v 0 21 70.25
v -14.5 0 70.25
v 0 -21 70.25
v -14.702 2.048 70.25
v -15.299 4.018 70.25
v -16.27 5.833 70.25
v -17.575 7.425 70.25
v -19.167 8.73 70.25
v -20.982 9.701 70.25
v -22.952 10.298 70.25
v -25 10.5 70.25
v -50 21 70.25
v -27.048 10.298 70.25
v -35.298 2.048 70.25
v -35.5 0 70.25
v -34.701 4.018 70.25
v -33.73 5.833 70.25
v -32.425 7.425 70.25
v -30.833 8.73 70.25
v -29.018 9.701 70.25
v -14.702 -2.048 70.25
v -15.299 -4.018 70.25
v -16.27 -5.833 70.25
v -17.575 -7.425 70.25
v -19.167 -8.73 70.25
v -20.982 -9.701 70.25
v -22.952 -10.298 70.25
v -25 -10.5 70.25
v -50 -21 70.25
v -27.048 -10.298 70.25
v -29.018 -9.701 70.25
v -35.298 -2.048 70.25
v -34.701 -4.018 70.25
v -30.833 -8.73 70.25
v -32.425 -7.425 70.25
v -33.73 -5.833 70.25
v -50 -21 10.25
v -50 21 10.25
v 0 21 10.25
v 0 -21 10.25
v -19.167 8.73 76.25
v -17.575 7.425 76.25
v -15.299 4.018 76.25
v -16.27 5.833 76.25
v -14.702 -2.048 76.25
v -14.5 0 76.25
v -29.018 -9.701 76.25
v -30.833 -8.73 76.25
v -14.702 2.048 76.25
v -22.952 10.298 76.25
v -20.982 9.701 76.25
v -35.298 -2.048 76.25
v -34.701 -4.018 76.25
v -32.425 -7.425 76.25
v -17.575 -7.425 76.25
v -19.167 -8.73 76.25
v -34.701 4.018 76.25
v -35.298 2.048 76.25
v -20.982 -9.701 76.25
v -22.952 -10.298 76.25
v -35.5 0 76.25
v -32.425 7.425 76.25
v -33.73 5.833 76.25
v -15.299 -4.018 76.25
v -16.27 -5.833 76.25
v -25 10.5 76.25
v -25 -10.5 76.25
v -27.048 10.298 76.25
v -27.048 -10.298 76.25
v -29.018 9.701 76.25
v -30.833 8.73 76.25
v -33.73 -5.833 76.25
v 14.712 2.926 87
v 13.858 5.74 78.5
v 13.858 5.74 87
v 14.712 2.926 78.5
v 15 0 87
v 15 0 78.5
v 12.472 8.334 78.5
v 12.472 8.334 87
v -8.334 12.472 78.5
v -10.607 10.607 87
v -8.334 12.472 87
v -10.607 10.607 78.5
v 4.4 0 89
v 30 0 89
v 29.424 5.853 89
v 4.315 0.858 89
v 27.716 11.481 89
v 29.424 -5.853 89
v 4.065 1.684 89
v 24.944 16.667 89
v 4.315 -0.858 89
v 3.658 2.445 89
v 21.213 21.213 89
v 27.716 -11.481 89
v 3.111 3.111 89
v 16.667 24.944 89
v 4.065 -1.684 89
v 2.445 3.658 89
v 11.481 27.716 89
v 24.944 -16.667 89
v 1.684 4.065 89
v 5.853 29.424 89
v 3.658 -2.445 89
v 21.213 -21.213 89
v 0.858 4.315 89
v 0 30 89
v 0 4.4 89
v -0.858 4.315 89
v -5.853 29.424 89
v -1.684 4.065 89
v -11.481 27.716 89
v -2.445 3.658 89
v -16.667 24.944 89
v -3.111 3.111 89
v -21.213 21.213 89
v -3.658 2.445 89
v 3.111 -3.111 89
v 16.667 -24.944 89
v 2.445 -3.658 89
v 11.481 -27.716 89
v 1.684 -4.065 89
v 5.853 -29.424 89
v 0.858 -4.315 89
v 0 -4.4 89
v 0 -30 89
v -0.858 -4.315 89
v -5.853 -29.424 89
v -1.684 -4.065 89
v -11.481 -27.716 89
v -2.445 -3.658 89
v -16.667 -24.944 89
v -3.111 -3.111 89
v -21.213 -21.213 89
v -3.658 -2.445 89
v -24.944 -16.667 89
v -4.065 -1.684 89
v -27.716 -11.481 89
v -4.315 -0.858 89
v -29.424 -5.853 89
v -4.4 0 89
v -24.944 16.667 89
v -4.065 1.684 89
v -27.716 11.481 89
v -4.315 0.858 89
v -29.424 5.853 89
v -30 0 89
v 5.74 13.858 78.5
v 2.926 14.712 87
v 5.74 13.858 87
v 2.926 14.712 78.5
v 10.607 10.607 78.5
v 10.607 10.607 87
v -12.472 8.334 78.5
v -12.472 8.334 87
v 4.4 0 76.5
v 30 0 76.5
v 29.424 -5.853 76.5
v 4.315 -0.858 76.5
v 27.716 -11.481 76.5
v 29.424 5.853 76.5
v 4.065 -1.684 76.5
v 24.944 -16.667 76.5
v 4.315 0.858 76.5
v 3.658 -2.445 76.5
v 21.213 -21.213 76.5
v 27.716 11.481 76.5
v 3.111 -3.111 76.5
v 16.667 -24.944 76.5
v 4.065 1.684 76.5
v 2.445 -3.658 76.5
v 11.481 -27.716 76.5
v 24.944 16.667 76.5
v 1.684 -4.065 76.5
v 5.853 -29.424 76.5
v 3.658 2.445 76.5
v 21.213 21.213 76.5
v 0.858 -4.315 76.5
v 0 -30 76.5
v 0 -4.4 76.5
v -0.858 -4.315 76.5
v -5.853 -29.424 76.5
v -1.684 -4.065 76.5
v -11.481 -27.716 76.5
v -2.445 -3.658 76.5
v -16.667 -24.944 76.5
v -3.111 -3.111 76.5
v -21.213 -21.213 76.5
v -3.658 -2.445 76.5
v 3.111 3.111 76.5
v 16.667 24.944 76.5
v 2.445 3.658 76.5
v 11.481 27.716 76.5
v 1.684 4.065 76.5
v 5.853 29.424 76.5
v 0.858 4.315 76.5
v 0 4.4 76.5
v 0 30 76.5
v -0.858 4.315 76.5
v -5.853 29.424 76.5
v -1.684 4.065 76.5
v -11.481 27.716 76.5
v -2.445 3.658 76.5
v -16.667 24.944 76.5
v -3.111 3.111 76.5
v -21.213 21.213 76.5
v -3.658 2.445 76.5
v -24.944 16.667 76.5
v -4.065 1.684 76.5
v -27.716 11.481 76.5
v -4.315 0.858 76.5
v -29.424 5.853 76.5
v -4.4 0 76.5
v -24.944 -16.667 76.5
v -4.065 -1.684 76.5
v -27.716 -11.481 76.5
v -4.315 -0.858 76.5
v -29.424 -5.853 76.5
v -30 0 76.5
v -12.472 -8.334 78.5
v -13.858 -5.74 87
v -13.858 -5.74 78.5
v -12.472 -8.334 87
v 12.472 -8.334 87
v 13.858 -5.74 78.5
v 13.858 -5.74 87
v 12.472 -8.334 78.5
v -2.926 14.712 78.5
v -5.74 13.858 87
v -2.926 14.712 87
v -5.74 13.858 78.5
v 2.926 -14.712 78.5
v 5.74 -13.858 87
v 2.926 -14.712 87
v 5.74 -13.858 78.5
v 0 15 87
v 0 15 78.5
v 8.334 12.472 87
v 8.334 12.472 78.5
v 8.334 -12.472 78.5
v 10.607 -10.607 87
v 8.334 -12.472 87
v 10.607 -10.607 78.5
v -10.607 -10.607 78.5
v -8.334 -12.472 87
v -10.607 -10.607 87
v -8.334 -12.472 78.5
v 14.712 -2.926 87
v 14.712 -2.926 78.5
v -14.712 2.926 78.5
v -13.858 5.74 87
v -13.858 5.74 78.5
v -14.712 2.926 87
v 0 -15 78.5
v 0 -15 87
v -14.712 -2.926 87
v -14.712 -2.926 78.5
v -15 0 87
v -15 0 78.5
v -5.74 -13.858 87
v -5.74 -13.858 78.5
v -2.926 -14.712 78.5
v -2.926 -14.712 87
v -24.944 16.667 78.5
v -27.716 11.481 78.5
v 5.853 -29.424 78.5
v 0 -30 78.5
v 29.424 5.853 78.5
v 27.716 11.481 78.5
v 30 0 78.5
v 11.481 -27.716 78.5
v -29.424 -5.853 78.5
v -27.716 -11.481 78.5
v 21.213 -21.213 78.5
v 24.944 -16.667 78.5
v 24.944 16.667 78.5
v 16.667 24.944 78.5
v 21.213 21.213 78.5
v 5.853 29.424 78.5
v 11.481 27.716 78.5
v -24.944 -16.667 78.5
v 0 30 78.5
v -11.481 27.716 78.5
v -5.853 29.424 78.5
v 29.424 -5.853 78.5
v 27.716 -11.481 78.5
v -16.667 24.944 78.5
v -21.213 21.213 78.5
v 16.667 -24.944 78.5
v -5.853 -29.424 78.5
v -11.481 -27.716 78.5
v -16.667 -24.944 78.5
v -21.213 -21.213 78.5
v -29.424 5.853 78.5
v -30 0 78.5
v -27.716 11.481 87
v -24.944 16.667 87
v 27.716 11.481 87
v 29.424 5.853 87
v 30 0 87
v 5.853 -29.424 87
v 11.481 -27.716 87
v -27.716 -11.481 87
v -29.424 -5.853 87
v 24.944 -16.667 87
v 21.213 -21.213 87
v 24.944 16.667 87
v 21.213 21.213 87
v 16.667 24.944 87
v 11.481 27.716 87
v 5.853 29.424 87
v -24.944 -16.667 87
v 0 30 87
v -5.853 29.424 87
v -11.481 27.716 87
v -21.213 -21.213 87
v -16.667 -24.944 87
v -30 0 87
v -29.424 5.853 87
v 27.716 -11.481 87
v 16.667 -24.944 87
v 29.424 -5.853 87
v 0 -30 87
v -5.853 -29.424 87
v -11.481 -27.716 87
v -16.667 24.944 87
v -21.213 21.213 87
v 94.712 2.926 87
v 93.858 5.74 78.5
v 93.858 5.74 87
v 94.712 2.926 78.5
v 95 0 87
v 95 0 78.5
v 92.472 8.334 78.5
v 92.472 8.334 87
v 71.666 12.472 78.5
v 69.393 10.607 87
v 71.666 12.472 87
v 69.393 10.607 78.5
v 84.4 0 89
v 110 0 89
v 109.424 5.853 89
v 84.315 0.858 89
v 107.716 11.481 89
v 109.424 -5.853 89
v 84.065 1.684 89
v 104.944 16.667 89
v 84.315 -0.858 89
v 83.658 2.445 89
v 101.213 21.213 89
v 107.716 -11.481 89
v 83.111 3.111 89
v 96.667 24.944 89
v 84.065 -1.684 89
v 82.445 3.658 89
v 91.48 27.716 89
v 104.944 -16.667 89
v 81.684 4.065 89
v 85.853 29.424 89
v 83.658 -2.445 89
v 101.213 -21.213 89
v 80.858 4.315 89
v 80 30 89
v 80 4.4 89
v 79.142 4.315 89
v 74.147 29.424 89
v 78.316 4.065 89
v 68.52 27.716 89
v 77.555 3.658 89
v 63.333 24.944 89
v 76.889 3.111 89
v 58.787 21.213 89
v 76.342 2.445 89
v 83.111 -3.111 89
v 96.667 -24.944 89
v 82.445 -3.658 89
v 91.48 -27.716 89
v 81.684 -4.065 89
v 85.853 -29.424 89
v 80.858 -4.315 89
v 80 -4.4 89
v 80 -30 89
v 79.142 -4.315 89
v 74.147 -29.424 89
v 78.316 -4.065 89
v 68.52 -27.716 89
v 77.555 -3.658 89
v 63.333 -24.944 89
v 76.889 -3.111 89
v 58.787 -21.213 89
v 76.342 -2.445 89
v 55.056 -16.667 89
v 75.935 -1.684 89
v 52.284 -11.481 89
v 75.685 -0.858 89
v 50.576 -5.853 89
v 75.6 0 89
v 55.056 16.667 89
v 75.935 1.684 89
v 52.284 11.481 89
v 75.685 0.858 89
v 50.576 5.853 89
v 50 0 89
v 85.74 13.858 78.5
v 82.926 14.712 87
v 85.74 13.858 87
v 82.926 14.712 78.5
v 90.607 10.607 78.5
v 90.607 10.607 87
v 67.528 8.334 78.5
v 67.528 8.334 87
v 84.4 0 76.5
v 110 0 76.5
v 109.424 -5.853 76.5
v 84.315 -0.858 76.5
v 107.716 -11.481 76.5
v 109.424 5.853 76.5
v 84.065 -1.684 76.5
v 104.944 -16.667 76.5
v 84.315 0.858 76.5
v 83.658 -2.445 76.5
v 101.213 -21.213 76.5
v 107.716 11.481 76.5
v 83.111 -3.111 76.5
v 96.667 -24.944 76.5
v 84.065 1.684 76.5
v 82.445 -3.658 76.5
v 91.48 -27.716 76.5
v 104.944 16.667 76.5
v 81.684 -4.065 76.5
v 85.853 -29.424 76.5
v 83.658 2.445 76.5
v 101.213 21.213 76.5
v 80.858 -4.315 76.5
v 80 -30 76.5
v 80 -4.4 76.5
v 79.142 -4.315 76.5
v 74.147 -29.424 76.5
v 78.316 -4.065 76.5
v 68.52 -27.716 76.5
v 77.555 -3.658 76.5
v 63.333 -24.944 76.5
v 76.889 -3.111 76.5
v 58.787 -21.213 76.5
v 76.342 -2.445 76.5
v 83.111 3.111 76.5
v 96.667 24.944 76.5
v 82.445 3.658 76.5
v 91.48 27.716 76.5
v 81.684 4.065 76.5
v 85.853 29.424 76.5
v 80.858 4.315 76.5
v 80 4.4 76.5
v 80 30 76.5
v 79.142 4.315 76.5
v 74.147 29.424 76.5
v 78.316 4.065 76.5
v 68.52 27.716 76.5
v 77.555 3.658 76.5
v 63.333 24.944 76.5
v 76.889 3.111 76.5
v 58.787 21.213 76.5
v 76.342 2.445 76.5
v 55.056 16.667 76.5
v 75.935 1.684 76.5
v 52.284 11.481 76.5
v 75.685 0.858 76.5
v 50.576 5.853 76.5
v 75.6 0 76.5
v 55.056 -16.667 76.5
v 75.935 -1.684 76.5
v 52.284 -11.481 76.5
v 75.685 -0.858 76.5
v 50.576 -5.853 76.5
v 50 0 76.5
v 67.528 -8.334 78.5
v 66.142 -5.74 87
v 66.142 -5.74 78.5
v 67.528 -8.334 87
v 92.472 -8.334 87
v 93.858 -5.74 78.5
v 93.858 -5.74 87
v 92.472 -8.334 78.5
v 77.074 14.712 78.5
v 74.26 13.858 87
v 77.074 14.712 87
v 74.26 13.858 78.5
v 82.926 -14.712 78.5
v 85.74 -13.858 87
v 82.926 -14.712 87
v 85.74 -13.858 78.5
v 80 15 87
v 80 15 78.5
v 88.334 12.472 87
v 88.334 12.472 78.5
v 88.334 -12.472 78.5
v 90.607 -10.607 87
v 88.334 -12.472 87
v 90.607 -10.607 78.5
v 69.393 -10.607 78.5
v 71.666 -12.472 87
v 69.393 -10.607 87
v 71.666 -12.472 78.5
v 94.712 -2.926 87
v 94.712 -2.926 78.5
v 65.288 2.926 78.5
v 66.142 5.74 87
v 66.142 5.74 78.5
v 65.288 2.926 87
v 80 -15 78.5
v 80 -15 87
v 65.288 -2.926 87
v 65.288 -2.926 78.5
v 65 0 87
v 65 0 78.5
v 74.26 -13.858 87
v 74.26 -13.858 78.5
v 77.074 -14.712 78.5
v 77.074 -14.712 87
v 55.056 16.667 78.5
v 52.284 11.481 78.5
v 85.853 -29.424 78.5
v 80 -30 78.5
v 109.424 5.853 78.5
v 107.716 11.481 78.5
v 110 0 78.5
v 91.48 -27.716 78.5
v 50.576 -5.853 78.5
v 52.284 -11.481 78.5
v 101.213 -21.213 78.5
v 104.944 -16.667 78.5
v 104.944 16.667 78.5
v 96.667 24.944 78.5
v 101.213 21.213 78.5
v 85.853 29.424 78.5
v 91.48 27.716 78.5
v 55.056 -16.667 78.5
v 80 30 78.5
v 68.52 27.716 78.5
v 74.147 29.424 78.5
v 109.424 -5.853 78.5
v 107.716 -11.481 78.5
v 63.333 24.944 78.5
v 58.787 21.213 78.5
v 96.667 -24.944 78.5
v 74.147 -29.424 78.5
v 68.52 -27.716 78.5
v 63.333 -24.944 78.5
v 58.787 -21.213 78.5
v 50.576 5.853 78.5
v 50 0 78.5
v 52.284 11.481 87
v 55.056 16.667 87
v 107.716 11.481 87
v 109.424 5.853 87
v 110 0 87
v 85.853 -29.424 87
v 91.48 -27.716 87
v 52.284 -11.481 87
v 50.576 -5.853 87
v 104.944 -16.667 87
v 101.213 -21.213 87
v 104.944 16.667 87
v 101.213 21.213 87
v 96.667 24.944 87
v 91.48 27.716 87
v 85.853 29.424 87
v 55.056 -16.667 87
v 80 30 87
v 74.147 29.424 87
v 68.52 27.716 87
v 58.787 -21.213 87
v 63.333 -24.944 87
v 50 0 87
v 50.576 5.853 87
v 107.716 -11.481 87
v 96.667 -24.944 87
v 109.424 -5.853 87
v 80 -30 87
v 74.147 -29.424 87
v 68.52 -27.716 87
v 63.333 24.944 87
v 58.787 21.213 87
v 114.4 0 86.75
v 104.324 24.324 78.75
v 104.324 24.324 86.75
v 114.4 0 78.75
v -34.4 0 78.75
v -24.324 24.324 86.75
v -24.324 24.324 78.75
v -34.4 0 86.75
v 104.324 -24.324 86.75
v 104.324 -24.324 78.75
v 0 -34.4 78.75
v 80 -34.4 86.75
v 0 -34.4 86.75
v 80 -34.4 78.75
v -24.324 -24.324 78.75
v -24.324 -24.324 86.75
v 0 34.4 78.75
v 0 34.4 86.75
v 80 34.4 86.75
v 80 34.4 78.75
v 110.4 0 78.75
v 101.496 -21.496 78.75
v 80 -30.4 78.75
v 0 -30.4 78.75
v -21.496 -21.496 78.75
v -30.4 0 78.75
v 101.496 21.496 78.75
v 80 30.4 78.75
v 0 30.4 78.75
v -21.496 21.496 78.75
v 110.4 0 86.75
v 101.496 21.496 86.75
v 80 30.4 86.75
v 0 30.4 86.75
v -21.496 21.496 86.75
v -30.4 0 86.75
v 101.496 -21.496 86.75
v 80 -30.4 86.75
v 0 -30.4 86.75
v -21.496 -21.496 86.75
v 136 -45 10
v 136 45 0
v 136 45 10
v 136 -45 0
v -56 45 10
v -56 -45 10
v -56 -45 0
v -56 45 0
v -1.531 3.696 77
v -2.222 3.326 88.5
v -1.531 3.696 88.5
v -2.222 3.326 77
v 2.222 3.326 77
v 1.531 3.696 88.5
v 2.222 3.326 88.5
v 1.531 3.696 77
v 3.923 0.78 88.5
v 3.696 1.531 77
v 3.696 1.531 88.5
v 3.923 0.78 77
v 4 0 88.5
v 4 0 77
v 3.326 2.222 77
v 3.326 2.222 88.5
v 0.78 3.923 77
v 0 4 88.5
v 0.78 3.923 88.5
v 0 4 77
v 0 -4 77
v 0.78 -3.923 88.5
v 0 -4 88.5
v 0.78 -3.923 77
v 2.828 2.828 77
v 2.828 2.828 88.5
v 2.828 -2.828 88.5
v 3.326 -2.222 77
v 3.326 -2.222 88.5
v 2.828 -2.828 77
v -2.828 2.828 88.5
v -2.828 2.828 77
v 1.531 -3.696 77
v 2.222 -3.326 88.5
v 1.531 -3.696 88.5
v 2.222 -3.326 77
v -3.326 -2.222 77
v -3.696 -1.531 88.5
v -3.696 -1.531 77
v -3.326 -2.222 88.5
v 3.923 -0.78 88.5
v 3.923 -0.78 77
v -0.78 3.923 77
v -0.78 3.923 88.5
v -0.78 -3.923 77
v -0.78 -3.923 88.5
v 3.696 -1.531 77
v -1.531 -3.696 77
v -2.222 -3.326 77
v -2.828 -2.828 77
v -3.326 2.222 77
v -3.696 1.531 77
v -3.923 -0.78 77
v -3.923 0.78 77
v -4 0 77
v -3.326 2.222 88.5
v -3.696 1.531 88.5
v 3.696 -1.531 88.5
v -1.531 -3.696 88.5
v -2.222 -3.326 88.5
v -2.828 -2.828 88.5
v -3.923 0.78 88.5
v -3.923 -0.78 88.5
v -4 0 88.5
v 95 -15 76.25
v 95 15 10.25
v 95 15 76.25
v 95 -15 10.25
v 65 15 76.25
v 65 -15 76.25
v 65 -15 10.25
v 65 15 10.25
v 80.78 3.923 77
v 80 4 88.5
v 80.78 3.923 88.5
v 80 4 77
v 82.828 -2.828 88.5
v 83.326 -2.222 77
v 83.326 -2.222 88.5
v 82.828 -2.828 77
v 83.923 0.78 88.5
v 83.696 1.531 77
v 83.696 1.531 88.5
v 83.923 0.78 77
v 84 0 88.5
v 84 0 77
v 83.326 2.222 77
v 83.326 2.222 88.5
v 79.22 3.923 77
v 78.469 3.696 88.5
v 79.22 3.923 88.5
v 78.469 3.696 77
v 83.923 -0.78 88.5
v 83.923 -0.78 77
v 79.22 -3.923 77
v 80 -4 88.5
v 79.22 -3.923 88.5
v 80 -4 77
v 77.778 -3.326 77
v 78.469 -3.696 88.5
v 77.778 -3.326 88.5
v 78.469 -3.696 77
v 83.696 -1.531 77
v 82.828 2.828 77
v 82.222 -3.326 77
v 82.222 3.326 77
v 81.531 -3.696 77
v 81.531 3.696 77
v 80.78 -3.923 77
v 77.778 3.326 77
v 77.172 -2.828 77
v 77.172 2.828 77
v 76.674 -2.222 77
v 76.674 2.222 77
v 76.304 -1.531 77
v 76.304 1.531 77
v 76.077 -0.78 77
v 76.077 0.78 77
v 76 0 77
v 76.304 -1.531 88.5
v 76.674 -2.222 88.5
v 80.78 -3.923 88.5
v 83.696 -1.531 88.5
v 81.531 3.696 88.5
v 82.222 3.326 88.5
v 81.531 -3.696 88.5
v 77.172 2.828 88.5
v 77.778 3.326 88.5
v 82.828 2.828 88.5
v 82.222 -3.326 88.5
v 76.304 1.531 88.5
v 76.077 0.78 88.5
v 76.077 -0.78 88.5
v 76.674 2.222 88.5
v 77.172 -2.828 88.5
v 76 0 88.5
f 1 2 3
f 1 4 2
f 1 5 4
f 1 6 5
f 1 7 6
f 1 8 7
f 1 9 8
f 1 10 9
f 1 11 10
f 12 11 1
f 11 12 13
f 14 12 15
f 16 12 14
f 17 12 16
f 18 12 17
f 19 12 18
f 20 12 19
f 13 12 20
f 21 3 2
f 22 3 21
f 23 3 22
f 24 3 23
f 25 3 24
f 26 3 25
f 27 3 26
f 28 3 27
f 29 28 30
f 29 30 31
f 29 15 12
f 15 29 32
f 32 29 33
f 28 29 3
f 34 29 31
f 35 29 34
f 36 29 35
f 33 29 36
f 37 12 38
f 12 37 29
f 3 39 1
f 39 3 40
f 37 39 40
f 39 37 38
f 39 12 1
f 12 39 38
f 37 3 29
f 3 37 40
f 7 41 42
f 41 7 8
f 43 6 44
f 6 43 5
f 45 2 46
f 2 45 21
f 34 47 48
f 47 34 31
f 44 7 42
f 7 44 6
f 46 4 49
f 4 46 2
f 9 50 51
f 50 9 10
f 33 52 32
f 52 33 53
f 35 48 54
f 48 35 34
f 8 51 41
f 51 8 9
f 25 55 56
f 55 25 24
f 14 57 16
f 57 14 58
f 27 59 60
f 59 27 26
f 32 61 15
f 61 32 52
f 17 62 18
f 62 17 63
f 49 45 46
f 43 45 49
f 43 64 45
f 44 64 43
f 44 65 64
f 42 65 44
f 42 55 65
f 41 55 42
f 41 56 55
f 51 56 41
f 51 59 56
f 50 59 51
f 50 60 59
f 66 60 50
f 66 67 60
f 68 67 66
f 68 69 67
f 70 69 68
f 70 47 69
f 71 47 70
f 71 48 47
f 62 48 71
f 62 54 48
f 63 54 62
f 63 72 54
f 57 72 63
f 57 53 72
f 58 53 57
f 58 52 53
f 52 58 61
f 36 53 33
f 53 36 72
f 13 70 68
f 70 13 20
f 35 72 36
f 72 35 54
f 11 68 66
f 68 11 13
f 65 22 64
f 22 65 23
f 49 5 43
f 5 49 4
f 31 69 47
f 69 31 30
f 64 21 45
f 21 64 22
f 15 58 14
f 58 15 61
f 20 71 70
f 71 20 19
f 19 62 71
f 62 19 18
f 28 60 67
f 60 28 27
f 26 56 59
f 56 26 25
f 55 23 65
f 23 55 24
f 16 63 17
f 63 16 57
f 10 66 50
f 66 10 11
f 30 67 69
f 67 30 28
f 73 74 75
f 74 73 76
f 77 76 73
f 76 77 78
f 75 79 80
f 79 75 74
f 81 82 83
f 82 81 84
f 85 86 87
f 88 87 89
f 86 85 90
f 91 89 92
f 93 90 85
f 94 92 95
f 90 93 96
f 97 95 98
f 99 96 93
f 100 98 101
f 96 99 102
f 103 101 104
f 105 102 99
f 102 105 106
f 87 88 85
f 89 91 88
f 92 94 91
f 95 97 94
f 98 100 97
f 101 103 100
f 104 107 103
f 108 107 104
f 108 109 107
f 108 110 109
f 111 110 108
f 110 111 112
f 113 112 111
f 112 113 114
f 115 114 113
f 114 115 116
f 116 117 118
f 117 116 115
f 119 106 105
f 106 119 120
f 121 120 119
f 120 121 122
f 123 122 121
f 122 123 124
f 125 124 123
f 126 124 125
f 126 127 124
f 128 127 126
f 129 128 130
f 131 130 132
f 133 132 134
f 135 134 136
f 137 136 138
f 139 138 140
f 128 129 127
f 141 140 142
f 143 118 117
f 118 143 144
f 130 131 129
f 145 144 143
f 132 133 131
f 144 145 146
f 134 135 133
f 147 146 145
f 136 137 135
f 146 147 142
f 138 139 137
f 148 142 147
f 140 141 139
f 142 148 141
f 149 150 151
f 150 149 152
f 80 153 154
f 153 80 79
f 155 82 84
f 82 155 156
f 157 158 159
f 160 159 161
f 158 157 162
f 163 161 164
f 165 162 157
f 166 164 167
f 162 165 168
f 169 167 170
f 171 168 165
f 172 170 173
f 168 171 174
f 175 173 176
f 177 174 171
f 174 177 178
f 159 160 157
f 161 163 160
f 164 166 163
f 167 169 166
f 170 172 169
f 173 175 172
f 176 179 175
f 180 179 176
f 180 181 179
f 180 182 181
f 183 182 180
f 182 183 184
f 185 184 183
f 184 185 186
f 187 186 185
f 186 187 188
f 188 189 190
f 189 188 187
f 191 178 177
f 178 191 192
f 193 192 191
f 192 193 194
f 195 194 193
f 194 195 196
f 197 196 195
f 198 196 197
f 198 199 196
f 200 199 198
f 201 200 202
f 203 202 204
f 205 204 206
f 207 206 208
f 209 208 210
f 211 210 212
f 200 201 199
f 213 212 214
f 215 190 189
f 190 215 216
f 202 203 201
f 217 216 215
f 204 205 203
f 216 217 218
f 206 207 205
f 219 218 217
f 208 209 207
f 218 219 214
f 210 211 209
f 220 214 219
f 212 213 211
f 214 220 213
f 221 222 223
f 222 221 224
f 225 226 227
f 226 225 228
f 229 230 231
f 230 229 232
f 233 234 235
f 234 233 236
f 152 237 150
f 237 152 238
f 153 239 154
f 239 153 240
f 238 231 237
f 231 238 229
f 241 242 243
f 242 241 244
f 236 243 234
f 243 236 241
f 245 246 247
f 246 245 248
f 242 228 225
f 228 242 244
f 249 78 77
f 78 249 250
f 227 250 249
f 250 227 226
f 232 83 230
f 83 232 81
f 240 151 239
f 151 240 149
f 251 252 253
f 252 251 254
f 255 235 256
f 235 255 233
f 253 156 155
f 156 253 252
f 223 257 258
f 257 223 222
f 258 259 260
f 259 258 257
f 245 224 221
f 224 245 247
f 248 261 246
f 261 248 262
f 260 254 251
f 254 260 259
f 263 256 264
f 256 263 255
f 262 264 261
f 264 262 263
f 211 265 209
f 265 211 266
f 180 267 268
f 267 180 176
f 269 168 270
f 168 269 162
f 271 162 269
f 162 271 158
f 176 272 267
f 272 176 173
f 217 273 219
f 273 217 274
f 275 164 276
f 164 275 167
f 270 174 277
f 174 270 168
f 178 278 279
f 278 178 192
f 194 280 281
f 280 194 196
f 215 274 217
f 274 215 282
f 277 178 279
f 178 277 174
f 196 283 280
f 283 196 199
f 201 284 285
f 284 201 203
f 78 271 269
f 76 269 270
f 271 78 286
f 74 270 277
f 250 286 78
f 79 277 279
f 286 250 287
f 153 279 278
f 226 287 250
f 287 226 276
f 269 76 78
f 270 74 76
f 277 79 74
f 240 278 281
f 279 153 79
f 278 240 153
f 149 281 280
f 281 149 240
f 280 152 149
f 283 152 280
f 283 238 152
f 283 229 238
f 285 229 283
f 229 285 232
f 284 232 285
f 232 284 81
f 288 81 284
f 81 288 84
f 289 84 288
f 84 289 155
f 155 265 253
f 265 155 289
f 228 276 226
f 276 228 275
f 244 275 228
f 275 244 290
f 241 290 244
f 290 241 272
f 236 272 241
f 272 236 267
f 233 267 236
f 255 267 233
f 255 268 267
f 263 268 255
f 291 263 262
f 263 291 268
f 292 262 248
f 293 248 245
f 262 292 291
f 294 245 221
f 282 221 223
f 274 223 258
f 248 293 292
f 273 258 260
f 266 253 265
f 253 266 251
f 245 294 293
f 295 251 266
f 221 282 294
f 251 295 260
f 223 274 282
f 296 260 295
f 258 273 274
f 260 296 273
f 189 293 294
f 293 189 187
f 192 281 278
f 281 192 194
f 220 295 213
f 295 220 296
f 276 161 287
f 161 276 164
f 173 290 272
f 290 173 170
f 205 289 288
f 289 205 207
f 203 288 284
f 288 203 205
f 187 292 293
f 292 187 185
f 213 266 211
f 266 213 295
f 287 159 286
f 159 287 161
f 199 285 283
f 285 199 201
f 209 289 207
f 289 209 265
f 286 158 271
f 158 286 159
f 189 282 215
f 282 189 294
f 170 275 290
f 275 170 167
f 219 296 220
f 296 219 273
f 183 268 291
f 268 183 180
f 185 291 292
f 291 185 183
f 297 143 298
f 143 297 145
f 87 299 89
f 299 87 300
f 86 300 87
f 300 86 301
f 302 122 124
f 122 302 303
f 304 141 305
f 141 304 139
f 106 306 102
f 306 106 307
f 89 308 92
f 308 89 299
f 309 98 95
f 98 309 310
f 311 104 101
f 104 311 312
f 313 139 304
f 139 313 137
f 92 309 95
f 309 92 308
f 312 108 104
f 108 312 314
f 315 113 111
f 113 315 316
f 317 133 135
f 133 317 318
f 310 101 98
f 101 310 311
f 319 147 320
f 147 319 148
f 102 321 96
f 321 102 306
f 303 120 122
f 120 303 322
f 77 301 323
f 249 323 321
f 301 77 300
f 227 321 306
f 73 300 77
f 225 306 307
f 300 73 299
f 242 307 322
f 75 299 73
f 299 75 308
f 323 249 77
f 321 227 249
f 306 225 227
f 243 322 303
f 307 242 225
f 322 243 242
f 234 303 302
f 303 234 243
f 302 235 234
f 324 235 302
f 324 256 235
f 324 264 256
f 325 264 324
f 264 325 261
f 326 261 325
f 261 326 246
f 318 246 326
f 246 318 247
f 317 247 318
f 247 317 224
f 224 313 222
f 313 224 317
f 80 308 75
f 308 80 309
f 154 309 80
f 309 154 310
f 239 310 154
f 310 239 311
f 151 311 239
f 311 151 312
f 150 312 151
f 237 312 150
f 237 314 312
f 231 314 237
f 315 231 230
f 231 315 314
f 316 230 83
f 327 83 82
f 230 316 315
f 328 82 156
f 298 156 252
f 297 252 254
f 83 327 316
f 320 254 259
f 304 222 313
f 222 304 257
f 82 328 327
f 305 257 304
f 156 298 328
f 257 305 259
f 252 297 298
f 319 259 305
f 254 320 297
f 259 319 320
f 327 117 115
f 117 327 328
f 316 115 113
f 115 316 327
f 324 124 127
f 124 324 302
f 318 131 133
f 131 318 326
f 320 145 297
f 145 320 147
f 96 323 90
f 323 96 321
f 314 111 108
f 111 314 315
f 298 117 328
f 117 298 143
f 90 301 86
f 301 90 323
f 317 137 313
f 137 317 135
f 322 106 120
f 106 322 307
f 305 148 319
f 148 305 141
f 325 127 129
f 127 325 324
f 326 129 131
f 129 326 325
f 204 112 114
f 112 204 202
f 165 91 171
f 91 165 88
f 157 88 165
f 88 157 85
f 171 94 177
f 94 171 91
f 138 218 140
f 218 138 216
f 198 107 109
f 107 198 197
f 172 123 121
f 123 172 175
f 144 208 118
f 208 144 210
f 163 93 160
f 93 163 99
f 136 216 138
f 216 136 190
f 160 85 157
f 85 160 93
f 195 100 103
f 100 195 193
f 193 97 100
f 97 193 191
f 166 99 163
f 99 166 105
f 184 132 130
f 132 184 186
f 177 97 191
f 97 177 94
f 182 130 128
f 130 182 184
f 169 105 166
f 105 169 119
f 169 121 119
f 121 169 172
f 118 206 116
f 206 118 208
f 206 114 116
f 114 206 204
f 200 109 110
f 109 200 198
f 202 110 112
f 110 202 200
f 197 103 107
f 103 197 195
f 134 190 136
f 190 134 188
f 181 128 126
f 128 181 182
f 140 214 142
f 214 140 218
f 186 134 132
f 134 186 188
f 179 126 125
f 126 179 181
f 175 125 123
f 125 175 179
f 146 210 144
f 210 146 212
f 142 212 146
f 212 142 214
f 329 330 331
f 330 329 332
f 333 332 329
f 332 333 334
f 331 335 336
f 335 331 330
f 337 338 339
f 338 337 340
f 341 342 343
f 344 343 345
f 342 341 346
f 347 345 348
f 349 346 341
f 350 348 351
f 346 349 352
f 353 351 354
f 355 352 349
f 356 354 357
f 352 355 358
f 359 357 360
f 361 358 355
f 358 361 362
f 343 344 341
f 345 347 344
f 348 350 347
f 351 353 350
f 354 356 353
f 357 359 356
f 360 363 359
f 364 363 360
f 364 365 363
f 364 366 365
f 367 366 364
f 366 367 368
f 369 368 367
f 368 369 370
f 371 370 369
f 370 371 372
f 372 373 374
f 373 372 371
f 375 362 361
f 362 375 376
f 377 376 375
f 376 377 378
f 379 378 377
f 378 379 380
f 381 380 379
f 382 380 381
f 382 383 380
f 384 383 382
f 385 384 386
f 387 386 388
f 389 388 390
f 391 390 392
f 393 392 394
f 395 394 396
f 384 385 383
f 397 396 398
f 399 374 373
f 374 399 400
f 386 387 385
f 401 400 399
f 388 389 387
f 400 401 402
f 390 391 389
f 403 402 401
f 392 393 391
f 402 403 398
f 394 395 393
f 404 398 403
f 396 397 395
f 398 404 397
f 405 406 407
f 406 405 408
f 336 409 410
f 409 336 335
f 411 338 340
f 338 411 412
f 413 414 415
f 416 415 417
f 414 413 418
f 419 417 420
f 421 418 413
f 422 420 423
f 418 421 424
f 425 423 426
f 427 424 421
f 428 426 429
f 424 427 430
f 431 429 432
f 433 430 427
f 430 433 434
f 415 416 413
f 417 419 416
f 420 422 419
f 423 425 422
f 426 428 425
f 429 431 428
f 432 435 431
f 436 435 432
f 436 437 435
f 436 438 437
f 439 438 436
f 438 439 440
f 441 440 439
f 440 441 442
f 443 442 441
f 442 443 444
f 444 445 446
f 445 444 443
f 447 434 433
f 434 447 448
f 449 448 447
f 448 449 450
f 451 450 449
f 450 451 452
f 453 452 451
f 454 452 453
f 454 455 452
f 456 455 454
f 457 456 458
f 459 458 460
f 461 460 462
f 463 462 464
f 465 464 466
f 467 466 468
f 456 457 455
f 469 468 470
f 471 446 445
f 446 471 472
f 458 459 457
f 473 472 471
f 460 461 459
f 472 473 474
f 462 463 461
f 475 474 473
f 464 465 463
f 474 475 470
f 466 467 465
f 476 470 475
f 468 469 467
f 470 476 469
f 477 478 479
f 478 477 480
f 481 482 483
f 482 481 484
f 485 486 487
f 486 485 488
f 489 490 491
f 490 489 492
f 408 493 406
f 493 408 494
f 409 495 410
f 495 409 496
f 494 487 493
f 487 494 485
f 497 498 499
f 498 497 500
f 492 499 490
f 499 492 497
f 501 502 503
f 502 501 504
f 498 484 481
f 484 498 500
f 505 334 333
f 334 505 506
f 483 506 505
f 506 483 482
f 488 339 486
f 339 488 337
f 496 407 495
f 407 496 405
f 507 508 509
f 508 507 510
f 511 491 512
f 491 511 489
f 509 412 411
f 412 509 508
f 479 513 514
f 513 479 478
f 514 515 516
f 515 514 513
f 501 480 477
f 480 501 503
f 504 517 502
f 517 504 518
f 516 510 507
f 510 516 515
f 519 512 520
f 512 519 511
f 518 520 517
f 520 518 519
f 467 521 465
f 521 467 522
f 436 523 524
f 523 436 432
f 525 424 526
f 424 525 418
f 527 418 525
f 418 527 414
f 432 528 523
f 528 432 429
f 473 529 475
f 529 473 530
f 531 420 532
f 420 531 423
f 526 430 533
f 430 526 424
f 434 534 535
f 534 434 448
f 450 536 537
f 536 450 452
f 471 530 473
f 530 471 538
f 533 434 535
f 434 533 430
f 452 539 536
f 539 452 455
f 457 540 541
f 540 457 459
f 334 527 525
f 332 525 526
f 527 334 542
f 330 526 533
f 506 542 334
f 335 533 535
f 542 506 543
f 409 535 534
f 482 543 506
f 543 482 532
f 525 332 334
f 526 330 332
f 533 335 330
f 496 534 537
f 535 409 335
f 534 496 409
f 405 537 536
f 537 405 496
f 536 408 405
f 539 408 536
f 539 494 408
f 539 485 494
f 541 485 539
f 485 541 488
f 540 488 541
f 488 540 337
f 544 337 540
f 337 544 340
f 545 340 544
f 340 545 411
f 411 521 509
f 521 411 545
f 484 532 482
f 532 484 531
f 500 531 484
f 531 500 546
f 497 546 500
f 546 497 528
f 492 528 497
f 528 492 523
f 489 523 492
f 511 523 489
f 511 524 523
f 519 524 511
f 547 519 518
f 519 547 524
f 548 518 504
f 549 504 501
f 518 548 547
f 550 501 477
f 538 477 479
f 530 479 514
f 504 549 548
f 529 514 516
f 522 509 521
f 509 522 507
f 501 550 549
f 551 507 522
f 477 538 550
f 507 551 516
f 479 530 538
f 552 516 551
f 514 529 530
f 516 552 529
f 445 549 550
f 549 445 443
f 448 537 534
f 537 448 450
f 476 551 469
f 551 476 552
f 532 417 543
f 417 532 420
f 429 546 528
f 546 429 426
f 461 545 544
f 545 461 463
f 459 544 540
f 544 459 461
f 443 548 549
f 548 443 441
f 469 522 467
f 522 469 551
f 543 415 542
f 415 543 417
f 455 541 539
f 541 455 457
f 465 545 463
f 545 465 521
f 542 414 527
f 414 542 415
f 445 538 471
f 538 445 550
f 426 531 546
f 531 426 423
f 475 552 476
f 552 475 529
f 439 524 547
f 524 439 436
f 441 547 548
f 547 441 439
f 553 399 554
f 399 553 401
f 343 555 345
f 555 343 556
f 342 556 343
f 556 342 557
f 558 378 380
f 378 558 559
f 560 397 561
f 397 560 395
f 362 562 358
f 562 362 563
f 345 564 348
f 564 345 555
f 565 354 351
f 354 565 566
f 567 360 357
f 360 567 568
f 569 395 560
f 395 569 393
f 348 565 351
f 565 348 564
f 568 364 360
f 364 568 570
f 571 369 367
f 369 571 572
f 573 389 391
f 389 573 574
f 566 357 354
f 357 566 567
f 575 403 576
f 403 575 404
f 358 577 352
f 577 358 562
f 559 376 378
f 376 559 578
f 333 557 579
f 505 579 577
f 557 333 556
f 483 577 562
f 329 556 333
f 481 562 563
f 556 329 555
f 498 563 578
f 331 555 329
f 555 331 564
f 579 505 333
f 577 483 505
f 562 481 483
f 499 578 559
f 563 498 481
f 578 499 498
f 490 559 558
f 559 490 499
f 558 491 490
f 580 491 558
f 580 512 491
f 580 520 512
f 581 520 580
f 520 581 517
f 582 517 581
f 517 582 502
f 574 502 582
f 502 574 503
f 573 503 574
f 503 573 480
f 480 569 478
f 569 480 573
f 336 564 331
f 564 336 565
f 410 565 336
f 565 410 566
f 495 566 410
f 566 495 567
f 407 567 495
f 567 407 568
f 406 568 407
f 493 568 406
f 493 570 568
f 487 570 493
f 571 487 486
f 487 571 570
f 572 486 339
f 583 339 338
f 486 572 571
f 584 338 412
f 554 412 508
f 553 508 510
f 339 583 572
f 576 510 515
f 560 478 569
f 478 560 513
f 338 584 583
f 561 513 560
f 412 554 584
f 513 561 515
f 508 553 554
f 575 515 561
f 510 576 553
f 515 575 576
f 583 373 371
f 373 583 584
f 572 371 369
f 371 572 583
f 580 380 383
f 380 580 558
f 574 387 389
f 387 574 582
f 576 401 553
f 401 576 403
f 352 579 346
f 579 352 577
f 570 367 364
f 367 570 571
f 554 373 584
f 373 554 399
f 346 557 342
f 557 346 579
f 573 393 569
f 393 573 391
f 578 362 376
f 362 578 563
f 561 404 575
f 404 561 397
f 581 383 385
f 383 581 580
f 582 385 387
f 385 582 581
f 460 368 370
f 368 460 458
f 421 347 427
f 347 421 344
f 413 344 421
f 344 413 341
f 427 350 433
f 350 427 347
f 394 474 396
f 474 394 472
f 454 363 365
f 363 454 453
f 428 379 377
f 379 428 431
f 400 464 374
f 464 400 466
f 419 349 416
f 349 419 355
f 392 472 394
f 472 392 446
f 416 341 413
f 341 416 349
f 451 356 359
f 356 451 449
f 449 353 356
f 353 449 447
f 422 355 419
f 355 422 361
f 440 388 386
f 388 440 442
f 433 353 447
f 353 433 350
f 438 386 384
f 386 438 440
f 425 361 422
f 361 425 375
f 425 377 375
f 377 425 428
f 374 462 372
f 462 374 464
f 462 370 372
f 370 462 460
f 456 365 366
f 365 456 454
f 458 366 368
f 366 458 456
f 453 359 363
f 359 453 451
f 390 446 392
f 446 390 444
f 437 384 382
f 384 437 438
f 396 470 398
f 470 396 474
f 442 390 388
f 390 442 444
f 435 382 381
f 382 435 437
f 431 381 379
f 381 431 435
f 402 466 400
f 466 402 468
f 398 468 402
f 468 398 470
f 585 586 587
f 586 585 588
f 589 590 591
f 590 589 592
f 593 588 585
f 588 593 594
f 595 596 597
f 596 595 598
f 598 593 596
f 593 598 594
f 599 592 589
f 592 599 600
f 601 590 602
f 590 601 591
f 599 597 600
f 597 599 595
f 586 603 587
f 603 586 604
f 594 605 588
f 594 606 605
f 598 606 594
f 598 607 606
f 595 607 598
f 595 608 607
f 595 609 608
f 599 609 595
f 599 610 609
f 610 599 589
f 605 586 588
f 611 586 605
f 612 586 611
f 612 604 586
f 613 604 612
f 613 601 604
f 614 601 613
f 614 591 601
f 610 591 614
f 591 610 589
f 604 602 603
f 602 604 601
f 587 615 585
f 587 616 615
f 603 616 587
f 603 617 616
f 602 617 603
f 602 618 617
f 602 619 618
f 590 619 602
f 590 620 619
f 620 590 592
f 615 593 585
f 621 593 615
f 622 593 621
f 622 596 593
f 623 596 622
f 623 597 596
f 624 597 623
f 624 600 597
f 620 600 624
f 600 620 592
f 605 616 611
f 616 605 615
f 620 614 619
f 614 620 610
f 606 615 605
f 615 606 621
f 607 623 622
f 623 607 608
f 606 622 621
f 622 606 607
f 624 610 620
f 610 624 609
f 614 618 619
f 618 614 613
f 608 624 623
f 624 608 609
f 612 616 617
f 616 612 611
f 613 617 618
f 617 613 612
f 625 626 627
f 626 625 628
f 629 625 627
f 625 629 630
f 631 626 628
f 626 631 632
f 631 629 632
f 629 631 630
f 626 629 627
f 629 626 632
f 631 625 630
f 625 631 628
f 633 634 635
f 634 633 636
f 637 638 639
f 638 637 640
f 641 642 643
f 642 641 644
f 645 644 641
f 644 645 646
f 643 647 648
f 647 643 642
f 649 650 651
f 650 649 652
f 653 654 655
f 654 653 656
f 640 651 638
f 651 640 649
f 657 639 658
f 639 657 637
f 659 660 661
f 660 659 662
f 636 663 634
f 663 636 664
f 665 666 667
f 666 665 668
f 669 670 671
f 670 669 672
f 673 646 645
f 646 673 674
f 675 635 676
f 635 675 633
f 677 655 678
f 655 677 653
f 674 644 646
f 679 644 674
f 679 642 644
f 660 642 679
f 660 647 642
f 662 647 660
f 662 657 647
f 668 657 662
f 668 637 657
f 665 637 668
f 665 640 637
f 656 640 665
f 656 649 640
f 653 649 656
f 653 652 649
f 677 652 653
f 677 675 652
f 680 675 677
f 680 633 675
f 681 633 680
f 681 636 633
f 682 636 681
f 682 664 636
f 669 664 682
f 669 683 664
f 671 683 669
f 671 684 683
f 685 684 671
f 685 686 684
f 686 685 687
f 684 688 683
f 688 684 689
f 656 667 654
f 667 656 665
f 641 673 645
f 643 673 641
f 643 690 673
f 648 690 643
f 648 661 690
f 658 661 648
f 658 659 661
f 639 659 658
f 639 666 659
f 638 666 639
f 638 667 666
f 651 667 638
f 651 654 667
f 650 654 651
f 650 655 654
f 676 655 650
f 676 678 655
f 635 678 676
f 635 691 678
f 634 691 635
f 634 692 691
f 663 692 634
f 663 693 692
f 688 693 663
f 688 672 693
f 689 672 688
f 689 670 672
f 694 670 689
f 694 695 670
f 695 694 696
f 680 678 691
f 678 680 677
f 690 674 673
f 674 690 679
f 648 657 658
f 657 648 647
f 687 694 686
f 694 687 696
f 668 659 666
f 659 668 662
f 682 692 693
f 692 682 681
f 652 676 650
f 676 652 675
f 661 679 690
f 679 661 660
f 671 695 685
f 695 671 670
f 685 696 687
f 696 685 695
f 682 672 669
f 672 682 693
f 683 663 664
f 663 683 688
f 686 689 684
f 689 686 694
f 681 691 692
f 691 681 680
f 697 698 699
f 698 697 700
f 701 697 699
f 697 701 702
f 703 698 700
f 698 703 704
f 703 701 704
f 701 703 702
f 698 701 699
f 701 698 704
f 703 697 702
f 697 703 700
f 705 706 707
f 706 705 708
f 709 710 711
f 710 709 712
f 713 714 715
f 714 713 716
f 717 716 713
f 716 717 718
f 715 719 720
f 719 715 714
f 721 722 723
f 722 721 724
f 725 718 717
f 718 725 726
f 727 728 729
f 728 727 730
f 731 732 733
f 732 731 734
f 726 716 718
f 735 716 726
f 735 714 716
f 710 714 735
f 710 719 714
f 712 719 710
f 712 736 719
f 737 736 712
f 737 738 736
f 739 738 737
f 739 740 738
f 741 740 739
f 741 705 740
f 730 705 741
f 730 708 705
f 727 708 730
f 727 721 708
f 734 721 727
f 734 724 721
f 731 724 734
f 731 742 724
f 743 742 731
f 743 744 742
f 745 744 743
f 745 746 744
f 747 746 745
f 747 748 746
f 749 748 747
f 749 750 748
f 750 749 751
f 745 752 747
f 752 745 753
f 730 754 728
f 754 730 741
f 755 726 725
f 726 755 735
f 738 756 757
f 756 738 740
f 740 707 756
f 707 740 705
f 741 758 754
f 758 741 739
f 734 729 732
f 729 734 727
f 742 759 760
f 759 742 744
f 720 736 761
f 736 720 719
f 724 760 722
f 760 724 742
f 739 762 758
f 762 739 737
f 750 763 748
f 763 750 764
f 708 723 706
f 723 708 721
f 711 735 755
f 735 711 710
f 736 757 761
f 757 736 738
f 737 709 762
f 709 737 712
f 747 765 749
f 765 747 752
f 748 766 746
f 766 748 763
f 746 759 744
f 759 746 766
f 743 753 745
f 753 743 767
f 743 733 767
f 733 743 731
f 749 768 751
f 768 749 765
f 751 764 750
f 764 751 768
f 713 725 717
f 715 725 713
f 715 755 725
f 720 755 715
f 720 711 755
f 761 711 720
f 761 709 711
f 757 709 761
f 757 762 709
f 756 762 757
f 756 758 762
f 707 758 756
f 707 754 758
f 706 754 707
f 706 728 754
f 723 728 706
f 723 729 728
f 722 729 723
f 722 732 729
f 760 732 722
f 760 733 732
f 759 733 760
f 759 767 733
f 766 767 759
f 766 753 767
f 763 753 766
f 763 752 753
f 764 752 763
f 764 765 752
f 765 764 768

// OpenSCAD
$fn = 32;

// ------------------------------------------------------------------------
// Motor belt drive: span 80 mm, pulleys d60, belt 8 mm wide
// Every part is its own module, assembly() places every instance.
// ------------------------------------------------------------------------

// --- part 1 ---
module base_plate() {
  difference() {
    translate([-96, -45, 0]) cube([192, 90, 10]);
  }
}

// --- part 2 ---
module motor() {
  union() {
    translate([-30, -21, 0]) cube([60, 42, 50]);
    translate([33, 0, 25]) rotate([0, 90, 0]) cylinder(h = 6, d = 21, center = true);
  }
}

// --- part 3 ---
module drive_shaft() {
  translate([0, 0, -5.75]) cylinder(h = 11.5, d = 8);
}

// --- part 4 ---
module pulley_drive() {
  difference() {
    union() {
      cylinder(h = 12.5, d = 30);
      cylinder(h = 2, d = 60);
      translate([0, 0, 10.5]) cylinder(h = 2, d = 60);
    }
    translate([0, 0, -1]) cylinder(h = 14.5, d = 8.8);
  }
}

// --- part 5 ---
module idler_post() {
  translate([-15, -15, 0]) cube([30, 30, 66]);
}

// --- part 6 ---
module driven_shaft() {
  translate([0, 0, -5.75]) cylinder(h = 11.5, d = 8);
}

// --- part 7 ---
module pulley_driven() {
  difference() {
    union() {
      cylinder(h = 12.5, d = 30);
      cylinder(h = 2, d = 60);
      translate([0, 0, 10.5]) cylinder(h = 2, d = 60);
    }
    translate([0, 0, -1]) cylinder(h = 14.5, d = 8.8);
  }
}

// --- part 8 ---
module drive_belt() {
  difference() {
    linear_extrude(height = 8) polygon(points = concat([for (a = [90 : 45 : 270]) [34.4 * cos(a), 34.4 * sin(a)]], [for (a = [270 : 45 : 450]) [80 + 34.4 * cos(a), 34.4 * sin(a)]]));
    translate([0, 0, -1]) linear_extrude(height = 10) polygon(points = concat([for (a = [90 : 45 : 270]) [30.4 * cos(a), 30.4 * sin(a)]], [for (a = [270 : 45 : 450]) [80 + 30.4 * cos(a), 30.4 * sin(a)]]));
  }
}

// --- assembly ---
module assembly() {
  color([0.80, 0.24, 0.20]) translate([40, 0, 0]) rotate([0, 0, 0]) base_plate();
  color([0.20, 0.45, 0.75]) translate([0, 0, 40.25]) rotate([0, 270, 0]) motor();
  color([0.25, 0.62, 0.32]) translate([0, 0, 82.75]) rotate([0, 0, 0]) drive_shaft();
  color([0.92, 0.70, 0.18]) translate([0, 0, 76.5]) rotate([0, 0, 0]) pulley_drive();
  color([0.58, 0.35, 0.70]) translate([80, 0, 10.25]) rotate([0, 0, 0]) idler_post();
  color([0.16, 0.66, 0.66]) translate([80, 0, 82.75]) rotate([0, 0, 0]) driven_shaft();
  color([0.85, 0.48, 0.18]) translate([80, 0, 76.5]) rotate([0, 0, 0]) pulley_driven();
  color([0.55, 0.60, 0.65]) translate([0, 0, 78.75]) rotate([0, 0, 0]) drive_belt();
}

assembly();
